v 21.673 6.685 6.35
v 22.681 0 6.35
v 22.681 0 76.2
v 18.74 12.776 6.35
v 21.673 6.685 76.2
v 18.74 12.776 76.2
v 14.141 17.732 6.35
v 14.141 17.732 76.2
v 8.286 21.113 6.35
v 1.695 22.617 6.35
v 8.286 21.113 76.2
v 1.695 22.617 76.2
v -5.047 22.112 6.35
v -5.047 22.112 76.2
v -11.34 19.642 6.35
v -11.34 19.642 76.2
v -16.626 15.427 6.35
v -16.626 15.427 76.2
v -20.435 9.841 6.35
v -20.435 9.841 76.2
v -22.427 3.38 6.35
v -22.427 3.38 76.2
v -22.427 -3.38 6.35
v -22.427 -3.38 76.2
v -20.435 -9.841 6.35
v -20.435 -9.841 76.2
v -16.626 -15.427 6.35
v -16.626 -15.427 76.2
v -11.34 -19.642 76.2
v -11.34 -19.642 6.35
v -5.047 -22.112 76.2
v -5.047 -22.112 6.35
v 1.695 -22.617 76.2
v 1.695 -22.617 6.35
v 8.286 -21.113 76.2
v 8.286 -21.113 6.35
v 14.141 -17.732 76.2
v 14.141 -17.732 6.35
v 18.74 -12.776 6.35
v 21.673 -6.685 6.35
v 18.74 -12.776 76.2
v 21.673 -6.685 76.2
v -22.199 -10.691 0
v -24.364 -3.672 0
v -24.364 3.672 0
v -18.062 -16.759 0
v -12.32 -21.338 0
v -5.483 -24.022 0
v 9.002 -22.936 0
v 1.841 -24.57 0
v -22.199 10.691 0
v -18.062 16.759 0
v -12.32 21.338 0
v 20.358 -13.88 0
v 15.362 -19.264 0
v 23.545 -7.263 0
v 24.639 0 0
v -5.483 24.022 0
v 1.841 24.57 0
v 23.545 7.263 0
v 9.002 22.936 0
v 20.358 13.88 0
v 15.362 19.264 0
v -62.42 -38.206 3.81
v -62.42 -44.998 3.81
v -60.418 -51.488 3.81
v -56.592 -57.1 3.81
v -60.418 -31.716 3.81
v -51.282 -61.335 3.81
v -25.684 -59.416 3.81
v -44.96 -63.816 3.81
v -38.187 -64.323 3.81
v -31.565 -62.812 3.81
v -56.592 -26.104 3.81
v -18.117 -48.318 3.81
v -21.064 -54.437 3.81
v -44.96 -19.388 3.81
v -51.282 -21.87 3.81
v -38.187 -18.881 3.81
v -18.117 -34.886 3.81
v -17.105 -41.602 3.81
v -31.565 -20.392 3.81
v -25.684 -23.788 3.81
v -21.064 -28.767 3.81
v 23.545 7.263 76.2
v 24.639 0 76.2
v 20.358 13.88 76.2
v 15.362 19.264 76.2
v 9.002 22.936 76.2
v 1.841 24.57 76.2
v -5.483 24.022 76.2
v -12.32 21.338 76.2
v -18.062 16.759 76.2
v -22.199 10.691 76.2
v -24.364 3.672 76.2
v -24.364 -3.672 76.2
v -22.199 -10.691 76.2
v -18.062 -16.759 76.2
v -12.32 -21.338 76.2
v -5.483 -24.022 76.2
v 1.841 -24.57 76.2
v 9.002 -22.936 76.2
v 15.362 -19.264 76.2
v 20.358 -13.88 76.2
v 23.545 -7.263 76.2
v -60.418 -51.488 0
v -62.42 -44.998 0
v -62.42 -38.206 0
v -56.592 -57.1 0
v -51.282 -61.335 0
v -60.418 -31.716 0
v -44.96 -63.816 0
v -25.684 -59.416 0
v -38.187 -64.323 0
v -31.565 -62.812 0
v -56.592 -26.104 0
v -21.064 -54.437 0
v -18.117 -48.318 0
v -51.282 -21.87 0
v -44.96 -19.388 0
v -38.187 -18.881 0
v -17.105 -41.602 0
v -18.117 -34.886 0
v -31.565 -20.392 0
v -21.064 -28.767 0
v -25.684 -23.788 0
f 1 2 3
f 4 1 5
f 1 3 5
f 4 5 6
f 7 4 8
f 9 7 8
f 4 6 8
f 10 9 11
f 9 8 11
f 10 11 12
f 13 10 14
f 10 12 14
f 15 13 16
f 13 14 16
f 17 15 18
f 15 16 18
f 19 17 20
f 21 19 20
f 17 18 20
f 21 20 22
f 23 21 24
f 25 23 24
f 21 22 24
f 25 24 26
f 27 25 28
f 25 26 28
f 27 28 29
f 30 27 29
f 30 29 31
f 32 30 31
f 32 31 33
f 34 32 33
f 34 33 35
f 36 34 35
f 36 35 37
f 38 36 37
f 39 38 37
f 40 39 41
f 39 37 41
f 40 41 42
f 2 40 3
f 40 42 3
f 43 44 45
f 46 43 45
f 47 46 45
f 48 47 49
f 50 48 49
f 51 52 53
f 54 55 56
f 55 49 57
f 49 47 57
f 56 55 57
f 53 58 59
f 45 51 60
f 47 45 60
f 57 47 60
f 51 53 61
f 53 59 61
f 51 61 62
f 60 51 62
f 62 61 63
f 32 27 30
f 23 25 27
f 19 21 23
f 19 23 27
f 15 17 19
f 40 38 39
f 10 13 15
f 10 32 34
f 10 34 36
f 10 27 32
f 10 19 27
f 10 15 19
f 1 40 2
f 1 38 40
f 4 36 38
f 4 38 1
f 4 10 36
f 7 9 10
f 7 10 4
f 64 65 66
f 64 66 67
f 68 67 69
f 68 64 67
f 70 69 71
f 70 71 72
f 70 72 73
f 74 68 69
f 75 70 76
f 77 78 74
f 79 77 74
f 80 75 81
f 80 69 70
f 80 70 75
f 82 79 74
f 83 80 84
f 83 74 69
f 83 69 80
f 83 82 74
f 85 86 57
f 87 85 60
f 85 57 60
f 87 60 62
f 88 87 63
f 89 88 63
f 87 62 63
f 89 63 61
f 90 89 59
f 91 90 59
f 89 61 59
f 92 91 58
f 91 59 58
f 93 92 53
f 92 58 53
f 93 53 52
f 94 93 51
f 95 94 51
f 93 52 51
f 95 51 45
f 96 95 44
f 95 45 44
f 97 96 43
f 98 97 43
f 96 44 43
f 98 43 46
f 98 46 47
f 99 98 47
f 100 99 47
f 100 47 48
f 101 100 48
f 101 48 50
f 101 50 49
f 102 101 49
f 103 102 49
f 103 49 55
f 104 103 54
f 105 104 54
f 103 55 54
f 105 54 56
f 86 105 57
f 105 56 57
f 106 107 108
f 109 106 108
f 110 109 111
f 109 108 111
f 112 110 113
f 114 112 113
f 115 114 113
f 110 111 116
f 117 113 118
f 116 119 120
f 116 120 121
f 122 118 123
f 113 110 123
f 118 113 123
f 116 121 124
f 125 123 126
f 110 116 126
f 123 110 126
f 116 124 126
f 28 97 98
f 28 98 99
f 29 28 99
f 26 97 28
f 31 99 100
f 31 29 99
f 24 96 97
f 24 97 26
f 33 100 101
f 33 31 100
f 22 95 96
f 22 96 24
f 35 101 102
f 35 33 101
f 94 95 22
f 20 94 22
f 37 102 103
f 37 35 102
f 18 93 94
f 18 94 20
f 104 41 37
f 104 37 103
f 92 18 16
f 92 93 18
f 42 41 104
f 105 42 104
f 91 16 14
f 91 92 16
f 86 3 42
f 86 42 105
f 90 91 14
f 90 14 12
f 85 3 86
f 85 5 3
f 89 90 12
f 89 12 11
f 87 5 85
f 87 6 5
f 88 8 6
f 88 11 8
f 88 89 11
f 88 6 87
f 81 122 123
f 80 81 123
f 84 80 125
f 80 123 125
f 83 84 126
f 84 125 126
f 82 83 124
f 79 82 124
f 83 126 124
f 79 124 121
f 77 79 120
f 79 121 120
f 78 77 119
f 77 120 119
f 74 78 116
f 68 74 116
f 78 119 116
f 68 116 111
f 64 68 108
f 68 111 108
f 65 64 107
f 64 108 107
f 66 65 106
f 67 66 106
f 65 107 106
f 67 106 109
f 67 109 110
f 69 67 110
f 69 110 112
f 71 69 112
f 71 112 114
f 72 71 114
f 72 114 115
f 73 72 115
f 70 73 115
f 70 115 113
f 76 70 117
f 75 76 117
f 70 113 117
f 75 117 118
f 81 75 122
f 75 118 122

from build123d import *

# Parameters (mm, degrees)
F0_R     = 24.639395
F1_DEPTH = 76.2
F2_R     = 22.680622
F3_DEPTH = 69.85
F4_R     = 22.78501
F5_DEPTH = 3.81


with BuildPart() as f1:
    # F0 (on Top) → F1 (new body)
    with BuildSketch(Plane.XY):
        Circle(F0_R)
    extrude(amount=F1_DEPTH)

    # F2 (on face) → F3 (cut)
    with BuildSketch(Plane.XY.offset(76.2)):
        Circle(F2_R)
    extrude(amount=-F3_DEPTH, mode=Mode.SUBTRACT)


with BuildPart() as f5:
    # F4 (on Top) → F5 (new body)
    with BuildSketch(Plane.XY):
        with Locations((-39.889749, -41.602127)):
            Circle(F4_R)
    extrude(amount=F5_DEPTH)


solid = Compound([f1.part, f5.part])
